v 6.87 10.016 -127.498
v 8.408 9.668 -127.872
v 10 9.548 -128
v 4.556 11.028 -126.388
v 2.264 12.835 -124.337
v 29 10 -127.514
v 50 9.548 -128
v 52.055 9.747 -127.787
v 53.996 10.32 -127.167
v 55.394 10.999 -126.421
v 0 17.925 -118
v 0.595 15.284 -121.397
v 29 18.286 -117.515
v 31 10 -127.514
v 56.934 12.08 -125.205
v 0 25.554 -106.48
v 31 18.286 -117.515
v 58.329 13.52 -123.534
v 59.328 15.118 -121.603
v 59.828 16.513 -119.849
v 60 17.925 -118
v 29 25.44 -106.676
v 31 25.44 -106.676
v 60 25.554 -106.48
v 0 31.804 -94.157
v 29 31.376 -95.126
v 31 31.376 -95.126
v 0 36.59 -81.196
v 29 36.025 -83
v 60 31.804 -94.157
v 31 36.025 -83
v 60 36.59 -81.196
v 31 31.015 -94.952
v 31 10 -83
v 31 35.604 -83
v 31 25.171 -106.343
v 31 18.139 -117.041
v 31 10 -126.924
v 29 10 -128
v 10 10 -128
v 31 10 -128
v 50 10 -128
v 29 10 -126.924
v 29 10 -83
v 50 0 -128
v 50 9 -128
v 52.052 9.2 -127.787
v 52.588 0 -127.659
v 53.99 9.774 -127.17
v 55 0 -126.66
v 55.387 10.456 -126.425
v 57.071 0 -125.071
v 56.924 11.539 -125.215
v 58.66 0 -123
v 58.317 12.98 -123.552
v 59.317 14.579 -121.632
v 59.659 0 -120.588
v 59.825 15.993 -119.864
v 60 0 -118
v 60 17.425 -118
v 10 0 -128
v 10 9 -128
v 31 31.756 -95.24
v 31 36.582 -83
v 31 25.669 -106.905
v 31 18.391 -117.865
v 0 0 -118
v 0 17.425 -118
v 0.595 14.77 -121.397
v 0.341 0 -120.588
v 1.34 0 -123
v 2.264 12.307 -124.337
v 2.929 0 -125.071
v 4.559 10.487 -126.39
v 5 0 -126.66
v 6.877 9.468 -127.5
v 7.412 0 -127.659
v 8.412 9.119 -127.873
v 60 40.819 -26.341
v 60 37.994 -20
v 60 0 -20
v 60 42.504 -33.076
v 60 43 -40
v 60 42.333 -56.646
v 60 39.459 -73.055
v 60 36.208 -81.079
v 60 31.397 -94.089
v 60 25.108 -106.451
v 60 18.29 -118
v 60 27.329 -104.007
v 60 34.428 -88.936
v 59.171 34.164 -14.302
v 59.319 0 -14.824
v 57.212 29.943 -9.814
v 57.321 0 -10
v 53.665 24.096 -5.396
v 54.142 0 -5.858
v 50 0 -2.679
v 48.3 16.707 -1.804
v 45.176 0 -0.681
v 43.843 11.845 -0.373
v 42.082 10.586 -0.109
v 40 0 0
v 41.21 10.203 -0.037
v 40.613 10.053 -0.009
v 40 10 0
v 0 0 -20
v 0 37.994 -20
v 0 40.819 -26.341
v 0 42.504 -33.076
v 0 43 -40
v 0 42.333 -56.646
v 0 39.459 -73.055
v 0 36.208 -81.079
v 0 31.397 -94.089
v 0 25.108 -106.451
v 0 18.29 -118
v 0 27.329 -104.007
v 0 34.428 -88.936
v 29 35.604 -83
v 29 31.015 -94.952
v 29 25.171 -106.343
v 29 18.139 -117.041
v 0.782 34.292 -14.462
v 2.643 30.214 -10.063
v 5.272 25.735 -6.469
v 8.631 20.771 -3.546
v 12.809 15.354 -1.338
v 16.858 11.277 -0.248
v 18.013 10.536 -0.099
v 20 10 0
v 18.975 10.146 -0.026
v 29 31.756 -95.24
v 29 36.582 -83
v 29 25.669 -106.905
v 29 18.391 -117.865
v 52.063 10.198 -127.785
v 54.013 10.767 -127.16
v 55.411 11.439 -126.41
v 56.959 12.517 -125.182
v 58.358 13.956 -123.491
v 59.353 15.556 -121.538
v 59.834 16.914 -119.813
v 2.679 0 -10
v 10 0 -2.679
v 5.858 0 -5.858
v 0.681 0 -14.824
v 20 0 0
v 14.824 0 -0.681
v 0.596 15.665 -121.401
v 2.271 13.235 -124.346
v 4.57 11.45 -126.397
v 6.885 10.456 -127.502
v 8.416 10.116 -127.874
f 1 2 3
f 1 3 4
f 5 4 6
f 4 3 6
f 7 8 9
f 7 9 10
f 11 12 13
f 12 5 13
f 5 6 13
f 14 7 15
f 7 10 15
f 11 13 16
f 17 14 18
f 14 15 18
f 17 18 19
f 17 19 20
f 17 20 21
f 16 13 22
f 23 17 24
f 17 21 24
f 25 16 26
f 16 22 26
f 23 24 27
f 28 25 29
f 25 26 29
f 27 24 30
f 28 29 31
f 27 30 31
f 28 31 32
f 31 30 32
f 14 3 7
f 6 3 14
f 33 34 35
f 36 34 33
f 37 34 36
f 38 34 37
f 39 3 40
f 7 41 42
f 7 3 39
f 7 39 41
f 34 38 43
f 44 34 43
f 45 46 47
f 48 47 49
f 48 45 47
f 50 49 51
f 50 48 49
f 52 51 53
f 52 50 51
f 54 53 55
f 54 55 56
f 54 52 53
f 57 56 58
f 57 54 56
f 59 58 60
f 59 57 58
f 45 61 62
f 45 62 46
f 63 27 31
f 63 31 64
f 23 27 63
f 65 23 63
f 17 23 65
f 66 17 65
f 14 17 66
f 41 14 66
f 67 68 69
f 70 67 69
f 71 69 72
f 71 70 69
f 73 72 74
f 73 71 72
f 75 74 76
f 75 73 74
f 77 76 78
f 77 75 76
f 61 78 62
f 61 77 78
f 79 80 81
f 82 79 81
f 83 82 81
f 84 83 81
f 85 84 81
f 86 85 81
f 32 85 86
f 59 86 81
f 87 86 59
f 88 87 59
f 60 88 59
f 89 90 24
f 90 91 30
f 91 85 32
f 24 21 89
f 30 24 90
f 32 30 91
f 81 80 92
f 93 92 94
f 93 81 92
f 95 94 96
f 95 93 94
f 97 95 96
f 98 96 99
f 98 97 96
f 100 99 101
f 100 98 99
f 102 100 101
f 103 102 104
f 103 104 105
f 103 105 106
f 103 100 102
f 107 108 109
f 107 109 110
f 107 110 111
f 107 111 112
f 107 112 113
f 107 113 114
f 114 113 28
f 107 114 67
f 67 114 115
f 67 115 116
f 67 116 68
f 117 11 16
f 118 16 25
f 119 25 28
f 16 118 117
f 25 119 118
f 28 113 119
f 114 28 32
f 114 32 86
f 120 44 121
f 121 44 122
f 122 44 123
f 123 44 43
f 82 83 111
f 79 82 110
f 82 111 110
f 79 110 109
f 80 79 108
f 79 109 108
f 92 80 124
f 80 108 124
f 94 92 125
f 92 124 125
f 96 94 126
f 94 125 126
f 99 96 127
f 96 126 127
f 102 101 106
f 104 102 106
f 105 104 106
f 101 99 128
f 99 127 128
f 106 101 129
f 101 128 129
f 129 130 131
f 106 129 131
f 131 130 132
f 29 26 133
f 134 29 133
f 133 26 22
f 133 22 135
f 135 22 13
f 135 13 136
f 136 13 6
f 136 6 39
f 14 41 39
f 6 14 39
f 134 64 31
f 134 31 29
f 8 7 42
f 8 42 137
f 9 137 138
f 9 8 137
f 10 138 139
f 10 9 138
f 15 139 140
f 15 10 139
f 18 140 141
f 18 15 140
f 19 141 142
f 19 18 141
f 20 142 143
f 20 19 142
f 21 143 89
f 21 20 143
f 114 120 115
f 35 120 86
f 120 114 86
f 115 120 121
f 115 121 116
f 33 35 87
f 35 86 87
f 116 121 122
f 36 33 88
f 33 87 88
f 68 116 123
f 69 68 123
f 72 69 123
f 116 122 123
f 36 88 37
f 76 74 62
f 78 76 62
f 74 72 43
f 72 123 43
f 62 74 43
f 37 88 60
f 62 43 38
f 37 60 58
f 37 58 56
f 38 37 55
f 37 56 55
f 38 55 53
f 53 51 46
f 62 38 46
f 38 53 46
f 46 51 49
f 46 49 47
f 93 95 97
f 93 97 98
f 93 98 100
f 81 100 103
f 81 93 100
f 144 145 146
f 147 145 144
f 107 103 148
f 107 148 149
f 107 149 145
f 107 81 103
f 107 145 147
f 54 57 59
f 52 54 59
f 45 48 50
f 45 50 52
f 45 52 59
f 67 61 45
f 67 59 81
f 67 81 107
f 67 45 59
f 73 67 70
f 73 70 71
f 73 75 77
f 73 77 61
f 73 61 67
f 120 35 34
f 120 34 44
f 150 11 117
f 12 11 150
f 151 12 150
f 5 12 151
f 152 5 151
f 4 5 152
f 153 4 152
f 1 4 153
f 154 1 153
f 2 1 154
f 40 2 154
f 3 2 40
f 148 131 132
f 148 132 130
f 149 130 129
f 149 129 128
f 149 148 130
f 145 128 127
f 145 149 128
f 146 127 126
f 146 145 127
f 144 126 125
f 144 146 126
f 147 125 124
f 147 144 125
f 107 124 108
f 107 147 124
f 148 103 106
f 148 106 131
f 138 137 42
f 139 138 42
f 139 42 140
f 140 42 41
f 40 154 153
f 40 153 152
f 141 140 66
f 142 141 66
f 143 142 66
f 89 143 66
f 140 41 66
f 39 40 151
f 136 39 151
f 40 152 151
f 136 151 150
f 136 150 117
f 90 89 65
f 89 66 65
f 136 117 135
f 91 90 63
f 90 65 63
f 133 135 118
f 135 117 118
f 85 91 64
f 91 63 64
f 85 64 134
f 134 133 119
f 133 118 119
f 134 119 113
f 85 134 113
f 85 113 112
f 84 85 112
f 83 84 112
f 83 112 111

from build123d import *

# Parameters (mm, degrees)
BOSS_EXTRUDE1_DEPTH          = 10
BOSS_EXTRUDE2_DEPTH          = 60
SKETCH1_2_OUTSIDE_W          = 91.554
SKETCH1_2_OUTSIDE_H          = 159.554
CUT_EXTRUDE1_DEPTH           = 60
CUT_EXTRUDE_THIN1_DEPTH      = 148.772850252
CUT_EXTRUDE_THIN1_DEPTH_BACK = 60
SKETCH5_W                    = 2
SKETCH5_H                    = 33
CUT_EXTRUDE2_DEPTH           = 45


with BuildPart() as part:
    # Sketch1 → Boss-Extrude1 (new body)
    with BuildSketch(Plane(origin=(0, 0, 0), x_dir=(1, 0, 0), z_dir=(0, 1, 0))):
        with BuildLine():
            Line((0, 20), (0, 118))
            ThreePointArc((0, 118), (2.928932188, 125.071067812), (10, 128))
            Line((10, 128), (50, 128))
            ThreePointArc((50, 128), (57.071067812, 125.071067812), (60, 118))
            Line((60, 118), (60, 20))
            ThreePointArc((60, 20), (54.142135624, 5.857864376), (40, 0))
            Line((40, 0), (20, 0))
            ThreePointArc((20, 0), (5.857864376, 5.857864376), (0, 20))
        make_face()
    extrude(amount=BOSS_EXTRUDE1_DEPTH)

    # Sketch2 → Boss-Extrude2 (add)
    with BuildSketch(Plane(origin=(0, 0, 0), x_dir=(0, 0, -1), z_dir=(1, 0, 0))):
        with BuildLine():
            Line((0, 10), (128, 10))
            ThreePointArc((128, 10), (87.219557783, 35.085487422), (40, 43))
            ThreePointArc((40, 43), (13.928263114, 33.859681074), (0, 10))
        make_face()
    extrude(amount=BOSS_EXTRUDE2_DEPTH)

    # Sketch1<2> outside → Cut-Extrude1 (cut)
    with BuildSketch(Plane(origin=(0, 0, 0), x_dir=(1, 0, 0), z_dir=(0, 1, 0))):
        with Locations((30, 64)):
            Rectangle(SKETCH1_2_OUTSIDE_W, SKETCH1_2_OUTSIDE_H)
        with BuildLine():
            Line((0, 20), (0, 118))
            ThreePointArc((0, 118), (2.928932188, 125.071067812), (10, 128))
            Line((10, 128), (50, 128))
            ThreePointArc((50, 128), (57.071067812, 125.071067812), (60, 118))
            Line((60, 118), (60, 20))
            ThreePointArc((60, 20), (54.142135624, 5.857864376), (40, 0))
            Line((40, 0), (20, 0))
            ThreePointArc((20, 0), (5.857864376, 5.857864376), (0, 20))
        make_face(mode=Mode.SUBTRACT)
    extrude(amount=CUT_EXTRUDE1_DEPTH, mode=Mode.SUBTRACT)

    # Sketch4 → Cut-Extrude-Thin1 (cut, two sides: drawn at the far end of the back side and taken through both)
    with BuildSketch(Plane.ZY.offset(-CUT_EXTRUDE_THIN1_DEPTH_BACK)):
        with BuildLine():
            ThreePointArc((-81.07900099, 36.207870964), (-106.107453338, 25.30792926), (-128, 9))
            Line((-128, 9), (-128.274111127, 9.291312701))
            ThreePointArc((-128.274111127, 9.291312701), (-106.308105761, 25.653961926), (-81.195672425, 36.590477519))
            Line((-81.195672425, 36.590477519), (-81.07900099, 36.207870964))
        make_face()
    extrude(amount=CUT_EXTRUDE_THIN1_DEPTH + CUT_EXTRUDE_THIN1_DEPTH_BACK, mode=Mode.SUBTRACT)

    # Sketch5 → Cut-Extrude2 (cut)
    with BuildSketch(Plane(origin=(0, 0, -128), x_dir=(-1, 0, 0), z_dir=(0, 0, -1))):
        with Locations((-30, 26.5)):
            Rectangle(SKETCH5_W, SKETCH5_H)
    extrude(amount=-CUT_EXTRUDE2_DEPTH, mode=Mode.SUBTRACT)


solid = part.part
